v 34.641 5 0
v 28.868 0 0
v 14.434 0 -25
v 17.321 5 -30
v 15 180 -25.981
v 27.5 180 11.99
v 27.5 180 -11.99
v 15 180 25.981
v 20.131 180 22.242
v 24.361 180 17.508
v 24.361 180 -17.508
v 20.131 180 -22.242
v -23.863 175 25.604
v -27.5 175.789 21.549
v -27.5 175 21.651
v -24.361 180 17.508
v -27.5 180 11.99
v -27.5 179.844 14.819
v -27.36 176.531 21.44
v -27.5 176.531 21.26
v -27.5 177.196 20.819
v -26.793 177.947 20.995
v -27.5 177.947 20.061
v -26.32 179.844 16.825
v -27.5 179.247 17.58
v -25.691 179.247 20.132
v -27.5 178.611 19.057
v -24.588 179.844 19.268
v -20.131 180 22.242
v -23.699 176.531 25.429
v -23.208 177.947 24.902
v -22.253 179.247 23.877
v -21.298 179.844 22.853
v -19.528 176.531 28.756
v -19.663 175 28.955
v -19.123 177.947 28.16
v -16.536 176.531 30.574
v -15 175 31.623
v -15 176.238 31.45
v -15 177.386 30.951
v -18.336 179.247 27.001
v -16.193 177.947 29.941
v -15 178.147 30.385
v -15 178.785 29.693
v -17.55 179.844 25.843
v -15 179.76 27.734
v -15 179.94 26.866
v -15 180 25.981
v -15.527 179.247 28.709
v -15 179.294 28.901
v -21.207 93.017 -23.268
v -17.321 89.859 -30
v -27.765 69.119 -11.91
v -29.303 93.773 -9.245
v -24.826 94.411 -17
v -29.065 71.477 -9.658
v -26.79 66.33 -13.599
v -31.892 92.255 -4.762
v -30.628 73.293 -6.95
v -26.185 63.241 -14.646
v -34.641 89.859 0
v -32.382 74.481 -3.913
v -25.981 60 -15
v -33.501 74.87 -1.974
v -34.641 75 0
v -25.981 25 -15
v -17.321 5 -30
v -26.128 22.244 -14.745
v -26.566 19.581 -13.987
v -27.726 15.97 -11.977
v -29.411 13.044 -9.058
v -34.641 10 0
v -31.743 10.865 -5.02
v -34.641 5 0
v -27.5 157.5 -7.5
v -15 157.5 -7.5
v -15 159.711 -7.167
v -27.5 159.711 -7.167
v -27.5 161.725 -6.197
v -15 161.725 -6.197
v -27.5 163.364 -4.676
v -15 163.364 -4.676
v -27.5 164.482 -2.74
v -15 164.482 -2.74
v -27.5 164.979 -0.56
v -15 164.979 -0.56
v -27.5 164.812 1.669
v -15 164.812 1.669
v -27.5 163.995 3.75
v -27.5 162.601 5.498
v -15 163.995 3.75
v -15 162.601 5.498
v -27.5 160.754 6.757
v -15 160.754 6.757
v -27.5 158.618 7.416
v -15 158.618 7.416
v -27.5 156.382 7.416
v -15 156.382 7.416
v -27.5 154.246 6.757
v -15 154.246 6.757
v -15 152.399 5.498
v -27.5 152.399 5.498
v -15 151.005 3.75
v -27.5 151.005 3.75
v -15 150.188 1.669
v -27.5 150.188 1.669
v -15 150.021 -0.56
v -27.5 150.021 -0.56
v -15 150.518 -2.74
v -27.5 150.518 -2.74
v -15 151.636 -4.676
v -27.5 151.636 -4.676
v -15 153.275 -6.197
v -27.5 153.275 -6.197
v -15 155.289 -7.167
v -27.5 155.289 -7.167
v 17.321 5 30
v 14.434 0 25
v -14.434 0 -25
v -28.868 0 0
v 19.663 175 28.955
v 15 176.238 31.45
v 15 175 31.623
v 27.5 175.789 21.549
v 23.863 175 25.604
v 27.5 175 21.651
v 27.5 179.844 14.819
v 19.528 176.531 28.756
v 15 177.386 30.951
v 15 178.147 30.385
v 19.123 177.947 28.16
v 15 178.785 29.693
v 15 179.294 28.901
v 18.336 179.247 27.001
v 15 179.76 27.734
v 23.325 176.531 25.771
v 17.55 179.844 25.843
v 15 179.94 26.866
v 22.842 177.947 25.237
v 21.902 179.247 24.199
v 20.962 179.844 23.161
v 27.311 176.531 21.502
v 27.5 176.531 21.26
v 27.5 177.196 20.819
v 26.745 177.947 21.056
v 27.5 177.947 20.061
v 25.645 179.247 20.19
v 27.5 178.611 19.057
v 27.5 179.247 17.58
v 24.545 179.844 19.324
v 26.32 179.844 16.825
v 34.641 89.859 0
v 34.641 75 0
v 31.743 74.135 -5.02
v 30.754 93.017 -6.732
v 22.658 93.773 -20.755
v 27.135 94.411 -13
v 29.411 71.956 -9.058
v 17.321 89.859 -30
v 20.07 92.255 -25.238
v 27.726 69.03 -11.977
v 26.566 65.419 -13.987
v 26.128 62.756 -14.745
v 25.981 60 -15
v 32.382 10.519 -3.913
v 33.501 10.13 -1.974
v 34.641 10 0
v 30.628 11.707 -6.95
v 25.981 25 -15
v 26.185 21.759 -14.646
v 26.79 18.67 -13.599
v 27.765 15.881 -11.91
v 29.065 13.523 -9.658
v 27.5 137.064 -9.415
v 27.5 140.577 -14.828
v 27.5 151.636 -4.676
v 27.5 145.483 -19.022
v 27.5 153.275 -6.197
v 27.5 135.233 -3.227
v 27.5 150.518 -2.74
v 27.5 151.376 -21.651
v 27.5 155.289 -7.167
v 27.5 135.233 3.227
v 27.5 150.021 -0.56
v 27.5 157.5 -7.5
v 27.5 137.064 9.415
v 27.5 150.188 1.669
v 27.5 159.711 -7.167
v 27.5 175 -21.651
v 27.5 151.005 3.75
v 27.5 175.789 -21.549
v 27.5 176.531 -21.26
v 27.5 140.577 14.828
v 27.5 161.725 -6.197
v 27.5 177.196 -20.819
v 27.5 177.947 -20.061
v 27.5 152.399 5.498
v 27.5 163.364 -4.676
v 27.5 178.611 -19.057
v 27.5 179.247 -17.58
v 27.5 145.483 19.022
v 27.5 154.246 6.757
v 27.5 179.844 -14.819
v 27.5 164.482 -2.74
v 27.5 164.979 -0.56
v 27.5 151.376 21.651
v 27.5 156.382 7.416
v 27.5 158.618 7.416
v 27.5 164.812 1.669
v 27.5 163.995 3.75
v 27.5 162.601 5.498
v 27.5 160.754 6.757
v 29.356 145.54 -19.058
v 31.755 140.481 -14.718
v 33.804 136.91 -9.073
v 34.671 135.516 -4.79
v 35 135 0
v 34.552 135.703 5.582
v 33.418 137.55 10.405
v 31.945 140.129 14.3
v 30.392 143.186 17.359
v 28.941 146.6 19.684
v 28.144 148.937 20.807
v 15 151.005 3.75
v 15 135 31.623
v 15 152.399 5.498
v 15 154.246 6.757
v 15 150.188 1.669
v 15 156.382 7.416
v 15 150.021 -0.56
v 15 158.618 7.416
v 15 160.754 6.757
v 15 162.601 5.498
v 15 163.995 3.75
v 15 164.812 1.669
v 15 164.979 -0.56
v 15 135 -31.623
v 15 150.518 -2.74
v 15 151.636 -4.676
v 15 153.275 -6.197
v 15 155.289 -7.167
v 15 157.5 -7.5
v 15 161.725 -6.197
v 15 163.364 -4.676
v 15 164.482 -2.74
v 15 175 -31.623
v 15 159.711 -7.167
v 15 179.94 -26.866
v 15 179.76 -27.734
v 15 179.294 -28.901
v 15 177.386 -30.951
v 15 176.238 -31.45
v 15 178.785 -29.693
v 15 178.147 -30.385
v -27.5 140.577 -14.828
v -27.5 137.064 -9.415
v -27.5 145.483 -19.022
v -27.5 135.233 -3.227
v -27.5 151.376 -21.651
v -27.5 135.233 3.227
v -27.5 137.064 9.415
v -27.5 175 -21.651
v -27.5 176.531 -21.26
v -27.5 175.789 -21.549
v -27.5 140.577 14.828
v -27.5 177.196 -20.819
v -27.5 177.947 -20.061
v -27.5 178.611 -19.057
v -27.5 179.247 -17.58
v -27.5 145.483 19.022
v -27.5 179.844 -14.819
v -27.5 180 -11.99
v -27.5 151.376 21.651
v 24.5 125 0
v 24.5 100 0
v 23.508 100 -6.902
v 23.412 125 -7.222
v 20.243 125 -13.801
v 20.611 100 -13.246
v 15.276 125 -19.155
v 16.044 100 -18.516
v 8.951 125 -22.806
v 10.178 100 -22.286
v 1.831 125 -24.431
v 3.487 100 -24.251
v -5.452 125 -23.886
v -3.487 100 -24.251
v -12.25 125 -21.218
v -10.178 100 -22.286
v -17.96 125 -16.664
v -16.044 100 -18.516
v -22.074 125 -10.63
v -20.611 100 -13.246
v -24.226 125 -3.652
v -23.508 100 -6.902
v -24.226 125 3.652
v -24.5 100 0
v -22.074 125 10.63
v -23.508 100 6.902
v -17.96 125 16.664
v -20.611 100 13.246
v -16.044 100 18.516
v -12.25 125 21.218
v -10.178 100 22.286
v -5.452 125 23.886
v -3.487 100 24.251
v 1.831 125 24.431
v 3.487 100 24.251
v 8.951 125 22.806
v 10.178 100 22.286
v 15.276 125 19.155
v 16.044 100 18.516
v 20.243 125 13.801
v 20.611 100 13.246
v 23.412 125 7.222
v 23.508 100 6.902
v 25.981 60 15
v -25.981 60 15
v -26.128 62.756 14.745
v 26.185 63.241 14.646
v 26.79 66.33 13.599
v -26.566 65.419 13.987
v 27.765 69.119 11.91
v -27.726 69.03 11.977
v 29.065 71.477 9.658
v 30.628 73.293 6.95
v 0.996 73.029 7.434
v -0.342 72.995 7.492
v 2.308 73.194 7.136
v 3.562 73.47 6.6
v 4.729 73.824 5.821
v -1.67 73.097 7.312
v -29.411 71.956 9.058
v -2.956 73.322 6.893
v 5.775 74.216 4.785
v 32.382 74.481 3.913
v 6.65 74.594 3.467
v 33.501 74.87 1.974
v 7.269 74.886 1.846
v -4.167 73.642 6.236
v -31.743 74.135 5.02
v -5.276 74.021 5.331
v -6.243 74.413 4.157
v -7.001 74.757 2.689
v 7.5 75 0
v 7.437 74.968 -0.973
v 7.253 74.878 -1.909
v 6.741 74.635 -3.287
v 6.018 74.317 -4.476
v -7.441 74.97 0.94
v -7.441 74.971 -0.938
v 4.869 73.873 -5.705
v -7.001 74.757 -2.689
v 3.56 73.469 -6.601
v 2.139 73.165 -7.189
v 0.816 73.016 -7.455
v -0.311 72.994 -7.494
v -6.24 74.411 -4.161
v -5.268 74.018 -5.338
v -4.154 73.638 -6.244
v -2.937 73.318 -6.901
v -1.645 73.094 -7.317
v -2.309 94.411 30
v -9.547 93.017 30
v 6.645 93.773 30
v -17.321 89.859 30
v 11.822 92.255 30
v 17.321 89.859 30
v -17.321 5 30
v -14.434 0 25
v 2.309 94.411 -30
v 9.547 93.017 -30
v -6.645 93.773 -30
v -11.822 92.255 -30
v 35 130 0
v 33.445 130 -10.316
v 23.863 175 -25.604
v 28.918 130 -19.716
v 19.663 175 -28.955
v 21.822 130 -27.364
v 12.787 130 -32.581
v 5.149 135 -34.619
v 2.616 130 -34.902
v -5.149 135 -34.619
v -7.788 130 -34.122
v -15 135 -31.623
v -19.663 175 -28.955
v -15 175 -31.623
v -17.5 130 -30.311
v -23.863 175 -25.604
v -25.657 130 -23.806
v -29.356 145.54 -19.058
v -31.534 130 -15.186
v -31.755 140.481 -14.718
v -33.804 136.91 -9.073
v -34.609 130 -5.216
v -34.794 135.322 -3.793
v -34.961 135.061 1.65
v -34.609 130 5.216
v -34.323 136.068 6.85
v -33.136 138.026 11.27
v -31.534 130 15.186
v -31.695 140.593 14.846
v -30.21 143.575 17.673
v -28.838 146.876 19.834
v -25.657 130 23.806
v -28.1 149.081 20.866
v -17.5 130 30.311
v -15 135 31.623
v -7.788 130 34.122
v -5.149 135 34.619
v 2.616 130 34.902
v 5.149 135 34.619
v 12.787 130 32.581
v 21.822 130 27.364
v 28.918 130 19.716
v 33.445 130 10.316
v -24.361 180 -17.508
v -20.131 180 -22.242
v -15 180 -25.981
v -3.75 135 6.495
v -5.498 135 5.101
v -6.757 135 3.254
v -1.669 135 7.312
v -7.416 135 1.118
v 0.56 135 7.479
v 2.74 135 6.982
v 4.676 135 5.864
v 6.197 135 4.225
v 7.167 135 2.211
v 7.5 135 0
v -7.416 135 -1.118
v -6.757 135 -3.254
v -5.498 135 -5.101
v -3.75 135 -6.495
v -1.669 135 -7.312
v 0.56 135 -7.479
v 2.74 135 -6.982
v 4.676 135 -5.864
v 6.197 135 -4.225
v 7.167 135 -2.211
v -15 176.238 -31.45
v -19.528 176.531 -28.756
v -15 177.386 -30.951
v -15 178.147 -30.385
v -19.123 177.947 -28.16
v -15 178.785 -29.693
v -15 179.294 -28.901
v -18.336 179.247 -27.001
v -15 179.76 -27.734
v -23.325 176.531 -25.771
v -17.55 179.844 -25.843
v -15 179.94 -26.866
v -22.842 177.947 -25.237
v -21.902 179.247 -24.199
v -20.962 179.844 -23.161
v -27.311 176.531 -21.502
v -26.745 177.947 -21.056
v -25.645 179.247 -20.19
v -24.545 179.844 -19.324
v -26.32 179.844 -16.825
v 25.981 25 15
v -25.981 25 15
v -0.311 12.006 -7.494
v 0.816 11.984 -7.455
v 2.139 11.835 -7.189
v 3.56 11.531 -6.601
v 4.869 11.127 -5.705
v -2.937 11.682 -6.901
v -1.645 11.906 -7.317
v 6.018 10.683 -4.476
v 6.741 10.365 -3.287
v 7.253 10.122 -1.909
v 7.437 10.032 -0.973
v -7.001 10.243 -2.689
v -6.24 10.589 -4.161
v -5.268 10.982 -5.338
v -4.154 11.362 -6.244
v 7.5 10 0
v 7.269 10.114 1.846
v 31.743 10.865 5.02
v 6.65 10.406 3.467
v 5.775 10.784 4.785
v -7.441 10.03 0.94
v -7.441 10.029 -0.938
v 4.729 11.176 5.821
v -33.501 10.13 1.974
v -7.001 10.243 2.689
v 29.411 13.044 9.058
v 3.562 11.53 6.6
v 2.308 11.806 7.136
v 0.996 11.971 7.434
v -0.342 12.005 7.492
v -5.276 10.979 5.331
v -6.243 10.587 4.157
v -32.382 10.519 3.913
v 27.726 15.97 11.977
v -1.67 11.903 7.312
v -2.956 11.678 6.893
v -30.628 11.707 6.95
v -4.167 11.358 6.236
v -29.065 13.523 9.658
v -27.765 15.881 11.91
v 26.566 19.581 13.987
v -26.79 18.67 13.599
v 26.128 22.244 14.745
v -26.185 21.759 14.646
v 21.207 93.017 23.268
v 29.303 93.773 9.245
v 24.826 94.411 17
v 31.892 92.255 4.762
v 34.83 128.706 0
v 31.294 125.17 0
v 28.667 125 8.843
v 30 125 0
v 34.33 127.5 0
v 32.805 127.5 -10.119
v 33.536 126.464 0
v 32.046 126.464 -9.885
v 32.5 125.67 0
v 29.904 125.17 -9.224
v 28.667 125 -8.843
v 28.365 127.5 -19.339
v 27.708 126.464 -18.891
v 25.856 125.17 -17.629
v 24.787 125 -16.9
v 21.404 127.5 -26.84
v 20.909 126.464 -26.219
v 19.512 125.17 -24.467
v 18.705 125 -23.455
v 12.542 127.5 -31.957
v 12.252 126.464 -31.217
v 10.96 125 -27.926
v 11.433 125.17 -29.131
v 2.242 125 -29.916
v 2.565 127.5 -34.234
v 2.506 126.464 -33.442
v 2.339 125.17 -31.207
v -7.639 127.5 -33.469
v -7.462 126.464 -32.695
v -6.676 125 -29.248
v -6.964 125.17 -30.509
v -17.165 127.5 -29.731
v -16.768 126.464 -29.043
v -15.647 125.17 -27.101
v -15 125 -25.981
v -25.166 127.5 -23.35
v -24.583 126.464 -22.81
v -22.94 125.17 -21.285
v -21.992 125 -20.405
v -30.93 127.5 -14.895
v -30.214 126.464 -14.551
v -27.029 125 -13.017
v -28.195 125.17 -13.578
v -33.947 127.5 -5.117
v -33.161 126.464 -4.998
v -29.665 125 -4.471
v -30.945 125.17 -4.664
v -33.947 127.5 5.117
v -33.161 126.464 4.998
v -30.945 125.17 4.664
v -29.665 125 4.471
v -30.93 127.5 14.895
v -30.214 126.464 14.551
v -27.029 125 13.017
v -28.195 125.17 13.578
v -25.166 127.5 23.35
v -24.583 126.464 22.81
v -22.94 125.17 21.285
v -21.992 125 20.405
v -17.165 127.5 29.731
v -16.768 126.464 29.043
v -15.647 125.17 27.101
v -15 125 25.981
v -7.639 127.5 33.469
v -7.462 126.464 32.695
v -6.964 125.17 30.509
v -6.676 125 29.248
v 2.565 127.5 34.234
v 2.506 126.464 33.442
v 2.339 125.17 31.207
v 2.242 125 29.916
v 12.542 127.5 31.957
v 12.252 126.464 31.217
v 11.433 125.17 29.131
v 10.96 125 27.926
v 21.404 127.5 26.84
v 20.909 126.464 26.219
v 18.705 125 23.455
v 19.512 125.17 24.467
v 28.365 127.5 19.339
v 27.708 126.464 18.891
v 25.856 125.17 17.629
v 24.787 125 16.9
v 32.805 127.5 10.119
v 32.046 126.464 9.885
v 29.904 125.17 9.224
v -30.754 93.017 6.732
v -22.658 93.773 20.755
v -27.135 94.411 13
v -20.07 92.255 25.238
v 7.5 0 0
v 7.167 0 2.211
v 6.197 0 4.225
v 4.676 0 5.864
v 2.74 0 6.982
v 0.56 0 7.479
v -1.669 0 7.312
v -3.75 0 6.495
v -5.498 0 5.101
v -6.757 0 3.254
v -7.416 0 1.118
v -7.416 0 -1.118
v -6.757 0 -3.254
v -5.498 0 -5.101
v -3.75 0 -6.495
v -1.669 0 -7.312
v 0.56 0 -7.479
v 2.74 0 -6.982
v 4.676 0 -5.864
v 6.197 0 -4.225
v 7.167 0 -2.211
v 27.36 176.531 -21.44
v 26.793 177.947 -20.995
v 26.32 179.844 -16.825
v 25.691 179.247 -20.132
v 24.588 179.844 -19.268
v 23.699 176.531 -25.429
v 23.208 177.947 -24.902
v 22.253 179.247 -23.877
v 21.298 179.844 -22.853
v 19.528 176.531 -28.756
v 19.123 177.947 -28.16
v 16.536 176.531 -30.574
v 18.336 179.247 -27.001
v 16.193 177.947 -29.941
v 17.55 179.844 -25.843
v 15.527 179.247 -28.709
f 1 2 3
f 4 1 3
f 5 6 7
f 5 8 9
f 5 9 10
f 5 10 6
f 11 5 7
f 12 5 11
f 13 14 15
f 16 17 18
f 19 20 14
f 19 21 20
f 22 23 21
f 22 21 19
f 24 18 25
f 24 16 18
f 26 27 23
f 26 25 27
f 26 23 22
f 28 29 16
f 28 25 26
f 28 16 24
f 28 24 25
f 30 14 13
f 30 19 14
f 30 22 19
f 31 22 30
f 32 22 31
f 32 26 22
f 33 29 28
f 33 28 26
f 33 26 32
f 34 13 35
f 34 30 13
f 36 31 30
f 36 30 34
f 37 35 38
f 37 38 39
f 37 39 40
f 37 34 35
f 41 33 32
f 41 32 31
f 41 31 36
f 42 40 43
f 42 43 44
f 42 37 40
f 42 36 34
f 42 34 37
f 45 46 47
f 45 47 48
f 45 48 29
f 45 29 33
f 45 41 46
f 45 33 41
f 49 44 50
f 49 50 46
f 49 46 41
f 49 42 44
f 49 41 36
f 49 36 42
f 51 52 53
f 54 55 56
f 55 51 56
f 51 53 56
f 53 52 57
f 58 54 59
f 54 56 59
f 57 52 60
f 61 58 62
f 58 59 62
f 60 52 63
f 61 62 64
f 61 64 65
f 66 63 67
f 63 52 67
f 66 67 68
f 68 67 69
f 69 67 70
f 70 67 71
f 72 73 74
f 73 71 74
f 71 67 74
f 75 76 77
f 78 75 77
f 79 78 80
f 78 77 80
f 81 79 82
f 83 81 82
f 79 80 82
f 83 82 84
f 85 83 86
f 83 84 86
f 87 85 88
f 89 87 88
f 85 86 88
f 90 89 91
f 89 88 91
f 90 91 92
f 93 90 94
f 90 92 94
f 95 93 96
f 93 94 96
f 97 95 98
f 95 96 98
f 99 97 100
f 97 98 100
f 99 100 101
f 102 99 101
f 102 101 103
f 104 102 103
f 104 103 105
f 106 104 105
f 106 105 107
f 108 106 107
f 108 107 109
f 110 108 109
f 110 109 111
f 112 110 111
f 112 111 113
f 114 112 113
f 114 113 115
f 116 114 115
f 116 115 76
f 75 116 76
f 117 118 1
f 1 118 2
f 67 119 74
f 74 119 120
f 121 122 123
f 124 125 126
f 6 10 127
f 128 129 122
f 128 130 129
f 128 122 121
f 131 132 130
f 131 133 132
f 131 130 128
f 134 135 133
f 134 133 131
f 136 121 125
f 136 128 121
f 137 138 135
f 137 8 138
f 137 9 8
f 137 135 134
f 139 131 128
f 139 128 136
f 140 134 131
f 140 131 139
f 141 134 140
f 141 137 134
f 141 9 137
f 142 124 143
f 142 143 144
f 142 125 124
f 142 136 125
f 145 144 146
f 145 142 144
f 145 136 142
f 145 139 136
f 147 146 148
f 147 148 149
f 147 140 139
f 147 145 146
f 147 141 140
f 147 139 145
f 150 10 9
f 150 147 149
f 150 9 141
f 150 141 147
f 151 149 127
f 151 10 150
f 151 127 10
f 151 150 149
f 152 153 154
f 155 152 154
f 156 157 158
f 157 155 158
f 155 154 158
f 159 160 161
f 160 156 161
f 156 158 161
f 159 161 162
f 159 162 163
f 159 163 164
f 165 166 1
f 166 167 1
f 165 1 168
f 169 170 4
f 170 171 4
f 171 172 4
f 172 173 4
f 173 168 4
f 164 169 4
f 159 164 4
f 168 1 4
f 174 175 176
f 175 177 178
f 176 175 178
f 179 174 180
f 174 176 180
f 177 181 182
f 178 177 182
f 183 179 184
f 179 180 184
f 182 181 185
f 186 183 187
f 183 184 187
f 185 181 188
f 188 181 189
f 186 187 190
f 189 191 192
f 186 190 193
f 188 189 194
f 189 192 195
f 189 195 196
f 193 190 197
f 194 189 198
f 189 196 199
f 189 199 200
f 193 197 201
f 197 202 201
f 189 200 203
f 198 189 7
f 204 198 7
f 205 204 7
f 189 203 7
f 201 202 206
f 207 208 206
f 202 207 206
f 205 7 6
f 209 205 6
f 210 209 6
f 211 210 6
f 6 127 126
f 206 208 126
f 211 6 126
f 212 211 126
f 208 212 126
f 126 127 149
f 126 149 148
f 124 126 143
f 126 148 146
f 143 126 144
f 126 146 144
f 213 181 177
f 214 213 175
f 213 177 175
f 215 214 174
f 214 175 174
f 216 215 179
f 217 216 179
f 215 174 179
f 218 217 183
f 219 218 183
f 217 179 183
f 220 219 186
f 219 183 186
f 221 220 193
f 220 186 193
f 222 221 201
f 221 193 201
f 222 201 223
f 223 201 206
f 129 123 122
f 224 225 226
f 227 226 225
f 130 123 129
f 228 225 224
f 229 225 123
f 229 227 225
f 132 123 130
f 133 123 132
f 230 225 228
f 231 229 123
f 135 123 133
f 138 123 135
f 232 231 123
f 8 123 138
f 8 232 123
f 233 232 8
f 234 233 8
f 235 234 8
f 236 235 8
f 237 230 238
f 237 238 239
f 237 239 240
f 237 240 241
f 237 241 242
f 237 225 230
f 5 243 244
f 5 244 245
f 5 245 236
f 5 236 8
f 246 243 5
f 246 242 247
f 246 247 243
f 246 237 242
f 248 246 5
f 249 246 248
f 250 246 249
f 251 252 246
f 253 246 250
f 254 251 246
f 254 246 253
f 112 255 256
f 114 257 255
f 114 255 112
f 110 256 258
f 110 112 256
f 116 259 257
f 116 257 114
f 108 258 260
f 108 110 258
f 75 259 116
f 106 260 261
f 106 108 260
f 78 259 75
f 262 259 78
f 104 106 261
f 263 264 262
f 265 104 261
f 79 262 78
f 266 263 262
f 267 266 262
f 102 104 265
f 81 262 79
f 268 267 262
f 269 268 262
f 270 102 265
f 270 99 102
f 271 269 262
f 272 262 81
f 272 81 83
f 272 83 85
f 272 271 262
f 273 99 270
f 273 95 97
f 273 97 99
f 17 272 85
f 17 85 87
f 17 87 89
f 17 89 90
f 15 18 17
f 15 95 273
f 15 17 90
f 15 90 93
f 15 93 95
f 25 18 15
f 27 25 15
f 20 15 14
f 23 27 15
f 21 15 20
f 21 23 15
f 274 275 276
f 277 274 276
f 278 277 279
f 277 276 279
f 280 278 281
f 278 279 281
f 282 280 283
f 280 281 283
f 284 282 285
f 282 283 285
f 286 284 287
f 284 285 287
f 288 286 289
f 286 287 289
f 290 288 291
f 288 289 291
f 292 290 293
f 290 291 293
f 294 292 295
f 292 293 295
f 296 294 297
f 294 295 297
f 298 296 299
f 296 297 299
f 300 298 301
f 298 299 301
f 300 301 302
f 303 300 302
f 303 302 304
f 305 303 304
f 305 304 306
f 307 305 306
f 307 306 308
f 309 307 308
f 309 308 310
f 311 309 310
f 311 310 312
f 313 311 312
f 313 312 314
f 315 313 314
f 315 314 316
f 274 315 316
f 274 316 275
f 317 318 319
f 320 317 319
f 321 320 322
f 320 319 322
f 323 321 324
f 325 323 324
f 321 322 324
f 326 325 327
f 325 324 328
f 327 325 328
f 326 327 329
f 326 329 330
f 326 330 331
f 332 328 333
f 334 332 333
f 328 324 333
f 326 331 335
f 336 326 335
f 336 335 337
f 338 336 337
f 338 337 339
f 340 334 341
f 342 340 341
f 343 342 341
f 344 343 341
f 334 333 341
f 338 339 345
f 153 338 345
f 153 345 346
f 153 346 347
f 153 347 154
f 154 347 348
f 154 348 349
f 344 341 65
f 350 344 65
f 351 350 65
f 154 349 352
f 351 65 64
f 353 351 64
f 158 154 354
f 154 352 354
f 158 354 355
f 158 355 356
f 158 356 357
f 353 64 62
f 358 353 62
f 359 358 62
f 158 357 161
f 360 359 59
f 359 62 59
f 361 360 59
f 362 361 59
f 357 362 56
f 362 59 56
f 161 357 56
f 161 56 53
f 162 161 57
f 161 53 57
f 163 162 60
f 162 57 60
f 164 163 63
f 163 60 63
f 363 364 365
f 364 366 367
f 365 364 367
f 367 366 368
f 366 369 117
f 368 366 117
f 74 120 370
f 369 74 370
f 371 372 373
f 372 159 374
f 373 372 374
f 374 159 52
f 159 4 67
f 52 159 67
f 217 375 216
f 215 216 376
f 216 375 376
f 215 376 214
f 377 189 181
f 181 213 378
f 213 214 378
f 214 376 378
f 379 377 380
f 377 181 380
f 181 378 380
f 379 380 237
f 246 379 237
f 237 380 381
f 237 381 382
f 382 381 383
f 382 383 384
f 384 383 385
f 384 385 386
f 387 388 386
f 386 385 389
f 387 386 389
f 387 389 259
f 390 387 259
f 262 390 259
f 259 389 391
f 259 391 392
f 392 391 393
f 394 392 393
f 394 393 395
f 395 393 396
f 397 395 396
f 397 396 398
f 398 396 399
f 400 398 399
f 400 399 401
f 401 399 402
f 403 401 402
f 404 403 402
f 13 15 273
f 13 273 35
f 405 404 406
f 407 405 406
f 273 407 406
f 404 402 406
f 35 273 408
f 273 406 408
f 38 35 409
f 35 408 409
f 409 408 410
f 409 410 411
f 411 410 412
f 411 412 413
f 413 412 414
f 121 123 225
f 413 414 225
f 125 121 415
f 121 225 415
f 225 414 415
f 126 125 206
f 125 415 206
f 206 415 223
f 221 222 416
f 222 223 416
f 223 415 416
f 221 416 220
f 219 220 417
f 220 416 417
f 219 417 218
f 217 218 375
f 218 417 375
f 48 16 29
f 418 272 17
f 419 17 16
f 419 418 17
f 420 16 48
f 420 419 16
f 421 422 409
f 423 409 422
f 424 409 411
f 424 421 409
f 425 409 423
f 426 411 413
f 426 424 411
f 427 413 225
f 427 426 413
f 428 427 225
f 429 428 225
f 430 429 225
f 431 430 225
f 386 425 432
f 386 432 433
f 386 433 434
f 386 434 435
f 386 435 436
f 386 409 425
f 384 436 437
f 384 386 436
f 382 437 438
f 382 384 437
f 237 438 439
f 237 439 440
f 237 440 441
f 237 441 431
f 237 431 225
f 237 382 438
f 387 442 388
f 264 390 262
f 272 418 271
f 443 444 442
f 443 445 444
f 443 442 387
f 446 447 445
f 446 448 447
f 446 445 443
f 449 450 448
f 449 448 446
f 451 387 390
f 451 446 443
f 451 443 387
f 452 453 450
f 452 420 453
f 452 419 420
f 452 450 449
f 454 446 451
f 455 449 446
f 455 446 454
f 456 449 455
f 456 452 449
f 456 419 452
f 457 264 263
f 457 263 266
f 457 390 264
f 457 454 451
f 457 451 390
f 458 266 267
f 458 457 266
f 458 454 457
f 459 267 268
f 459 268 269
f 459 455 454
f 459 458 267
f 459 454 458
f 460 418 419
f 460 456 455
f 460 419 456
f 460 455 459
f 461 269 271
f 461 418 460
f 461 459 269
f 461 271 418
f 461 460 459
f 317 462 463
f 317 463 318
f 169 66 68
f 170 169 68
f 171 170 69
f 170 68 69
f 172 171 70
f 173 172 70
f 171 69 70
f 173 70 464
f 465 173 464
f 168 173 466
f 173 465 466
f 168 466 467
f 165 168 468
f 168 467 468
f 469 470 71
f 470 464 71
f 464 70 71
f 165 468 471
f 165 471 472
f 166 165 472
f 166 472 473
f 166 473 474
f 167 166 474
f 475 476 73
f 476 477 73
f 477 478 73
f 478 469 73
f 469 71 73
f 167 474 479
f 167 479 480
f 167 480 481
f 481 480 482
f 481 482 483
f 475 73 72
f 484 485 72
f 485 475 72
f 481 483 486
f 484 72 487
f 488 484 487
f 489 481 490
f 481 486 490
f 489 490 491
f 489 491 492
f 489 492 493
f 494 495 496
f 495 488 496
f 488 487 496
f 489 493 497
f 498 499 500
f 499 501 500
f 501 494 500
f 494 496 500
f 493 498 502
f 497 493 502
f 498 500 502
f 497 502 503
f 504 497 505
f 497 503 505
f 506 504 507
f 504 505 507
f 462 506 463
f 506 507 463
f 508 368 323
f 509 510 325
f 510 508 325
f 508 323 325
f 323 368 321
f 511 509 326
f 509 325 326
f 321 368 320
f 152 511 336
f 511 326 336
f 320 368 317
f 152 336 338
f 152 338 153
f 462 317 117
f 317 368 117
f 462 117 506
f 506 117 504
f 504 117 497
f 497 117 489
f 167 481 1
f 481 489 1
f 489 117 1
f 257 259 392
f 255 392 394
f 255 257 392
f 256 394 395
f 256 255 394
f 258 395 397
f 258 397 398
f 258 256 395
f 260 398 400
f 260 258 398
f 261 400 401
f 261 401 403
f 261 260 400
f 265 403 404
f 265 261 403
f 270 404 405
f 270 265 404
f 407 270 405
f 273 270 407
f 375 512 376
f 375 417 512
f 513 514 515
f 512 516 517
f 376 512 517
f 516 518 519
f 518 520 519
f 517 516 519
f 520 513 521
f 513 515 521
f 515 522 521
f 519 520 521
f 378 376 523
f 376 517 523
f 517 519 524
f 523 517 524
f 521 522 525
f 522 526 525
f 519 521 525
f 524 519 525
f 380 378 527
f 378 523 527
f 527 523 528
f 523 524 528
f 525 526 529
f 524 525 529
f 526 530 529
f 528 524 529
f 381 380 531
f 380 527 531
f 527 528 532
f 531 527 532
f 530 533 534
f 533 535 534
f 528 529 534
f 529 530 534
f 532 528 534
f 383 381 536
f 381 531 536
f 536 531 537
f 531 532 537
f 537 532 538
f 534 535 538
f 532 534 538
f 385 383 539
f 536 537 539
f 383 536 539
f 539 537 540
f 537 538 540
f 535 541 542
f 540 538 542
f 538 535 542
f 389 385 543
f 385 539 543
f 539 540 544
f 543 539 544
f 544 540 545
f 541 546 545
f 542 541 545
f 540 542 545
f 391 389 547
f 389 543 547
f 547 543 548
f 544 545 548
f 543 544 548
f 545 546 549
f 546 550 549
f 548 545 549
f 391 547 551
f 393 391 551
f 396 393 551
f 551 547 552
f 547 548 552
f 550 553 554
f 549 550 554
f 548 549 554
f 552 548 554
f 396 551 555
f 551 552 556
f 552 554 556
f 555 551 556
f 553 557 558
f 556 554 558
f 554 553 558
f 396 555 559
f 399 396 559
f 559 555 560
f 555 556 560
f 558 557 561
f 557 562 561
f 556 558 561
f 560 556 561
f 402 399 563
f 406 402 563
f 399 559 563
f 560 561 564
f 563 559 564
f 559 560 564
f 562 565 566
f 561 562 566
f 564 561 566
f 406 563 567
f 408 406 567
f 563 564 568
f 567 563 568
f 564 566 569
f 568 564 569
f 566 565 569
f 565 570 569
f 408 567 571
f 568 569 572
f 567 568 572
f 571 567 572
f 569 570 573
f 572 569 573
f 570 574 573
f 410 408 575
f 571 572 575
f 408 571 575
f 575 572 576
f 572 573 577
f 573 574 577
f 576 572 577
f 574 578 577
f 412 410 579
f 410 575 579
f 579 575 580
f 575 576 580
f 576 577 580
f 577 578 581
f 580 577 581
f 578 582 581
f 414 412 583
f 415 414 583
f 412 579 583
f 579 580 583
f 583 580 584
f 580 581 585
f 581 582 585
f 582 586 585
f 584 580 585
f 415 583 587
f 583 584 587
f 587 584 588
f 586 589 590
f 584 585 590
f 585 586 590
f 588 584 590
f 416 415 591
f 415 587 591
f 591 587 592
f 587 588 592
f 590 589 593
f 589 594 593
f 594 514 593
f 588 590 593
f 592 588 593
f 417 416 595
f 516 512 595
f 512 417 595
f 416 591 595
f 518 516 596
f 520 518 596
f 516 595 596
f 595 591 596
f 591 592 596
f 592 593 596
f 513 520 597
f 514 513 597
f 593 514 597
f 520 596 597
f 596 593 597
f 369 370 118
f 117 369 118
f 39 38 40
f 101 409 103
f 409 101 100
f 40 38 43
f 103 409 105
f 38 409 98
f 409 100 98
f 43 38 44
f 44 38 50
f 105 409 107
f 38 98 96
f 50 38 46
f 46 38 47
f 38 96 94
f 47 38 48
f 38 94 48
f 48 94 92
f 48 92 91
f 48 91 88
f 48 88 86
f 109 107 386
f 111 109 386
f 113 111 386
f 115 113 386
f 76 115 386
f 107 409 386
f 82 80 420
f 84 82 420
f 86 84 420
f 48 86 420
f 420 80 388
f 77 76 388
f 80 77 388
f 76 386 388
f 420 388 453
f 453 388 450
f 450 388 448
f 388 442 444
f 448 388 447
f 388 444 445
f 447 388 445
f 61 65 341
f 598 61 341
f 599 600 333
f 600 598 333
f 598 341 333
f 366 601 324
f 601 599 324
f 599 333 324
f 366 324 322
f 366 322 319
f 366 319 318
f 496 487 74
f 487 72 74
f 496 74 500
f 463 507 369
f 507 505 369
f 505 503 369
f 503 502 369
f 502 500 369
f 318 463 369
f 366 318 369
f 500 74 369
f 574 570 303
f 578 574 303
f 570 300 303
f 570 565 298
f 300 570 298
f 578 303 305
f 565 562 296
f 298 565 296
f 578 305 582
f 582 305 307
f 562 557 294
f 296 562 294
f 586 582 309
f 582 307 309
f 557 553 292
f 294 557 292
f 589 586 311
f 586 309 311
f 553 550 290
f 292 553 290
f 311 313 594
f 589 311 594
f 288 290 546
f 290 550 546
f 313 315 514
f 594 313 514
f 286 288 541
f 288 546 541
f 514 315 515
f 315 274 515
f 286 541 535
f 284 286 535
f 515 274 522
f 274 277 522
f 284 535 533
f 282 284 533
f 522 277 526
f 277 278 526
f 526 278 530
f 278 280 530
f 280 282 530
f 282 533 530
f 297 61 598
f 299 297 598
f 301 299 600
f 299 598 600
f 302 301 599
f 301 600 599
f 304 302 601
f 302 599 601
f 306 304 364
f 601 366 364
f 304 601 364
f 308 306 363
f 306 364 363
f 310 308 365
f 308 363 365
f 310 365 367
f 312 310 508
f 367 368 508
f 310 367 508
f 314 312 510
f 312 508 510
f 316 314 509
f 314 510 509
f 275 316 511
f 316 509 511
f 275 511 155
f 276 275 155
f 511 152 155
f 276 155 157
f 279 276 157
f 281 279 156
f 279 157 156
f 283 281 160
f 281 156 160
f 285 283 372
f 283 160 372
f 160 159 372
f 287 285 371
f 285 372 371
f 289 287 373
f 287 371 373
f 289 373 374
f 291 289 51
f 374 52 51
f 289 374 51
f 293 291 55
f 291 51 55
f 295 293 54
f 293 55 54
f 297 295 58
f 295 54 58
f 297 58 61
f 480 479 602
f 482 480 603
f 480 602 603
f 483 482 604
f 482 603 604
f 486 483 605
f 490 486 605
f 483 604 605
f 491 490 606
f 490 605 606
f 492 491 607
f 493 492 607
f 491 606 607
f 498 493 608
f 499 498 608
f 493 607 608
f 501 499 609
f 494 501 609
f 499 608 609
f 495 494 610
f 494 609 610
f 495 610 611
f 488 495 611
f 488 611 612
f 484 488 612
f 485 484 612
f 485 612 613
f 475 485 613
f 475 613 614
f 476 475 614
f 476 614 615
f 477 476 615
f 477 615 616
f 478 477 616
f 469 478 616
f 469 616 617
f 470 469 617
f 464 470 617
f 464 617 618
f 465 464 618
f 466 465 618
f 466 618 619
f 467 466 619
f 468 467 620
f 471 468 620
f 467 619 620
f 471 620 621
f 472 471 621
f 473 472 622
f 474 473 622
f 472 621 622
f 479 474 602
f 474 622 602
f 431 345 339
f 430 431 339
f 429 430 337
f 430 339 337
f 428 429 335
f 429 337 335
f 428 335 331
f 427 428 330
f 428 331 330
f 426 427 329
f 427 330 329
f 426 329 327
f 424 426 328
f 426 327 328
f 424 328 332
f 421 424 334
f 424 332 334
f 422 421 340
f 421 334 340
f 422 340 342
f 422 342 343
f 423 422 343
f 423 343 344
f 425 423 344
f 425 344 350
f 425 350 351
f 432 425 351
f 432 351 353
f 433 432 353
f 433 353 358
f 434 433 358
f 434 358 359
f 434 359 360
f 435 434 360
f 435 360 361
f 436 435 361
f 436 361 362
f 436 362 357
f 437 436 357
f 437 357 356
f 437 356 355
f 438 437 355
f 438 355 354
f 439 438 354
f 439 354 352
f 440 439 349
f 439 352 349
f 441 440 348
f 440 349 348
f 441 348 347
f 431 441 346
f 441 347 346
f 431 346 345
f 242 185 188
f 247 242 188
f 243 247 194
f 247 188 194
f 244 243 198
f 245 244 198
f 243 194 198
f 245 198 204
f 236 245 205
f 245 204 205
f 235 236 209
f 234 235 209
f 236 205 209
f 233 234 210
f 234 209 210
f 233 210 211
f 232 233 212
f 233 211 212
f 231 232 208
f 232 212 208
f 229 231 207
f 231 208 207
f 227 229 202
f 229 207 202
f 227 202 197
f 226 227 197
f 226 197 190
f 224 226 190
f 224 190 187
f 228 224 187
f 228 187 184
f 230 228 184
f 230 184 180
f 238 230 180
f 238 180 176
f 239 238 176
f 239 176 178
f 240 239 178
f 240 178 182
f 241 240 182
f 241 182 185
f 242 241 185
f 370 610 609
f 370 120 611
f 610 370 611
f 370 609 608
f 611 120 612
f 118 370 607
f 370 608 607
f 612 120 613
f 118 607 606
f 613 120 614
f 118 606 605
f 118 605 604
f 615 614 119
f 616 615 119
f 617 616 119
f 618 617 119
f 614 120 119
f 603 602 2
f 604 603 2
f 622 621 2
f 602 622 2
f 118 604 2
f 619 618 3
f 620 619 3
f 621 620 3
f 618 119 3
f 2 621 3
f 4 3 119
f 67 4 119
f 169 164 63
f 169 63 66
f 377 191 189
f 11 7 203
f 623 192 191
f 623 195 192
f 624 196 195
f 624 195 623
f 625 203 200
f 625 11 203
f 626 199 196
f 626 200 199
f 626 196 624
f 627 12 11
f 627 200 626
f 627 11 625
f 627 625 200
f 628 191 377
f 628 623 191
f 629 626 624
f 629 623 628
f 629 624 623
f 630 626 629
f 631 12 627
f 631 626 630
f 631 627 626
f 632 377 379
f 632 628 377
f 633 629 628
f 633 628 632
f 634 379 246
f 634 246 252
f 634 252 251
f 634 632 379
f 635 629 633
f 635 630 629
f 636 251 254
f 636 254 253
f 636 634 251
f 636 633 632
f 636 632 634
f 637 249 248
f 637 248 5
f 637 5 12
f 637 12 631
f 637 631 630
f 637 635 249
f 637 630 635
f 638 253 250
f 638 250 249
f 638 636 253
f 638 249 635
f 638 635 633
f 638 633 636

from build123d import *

# Parameters (mm, degrees)
BOSS_EXTRUDE1_DEPTH     = 100
CHAMFER1_SIZE           = 5
CUT_EXTRUDE1_DEPTH      = 35.641016151
CUT_EXTRUDE1_DEPTH_BACK = 35.641016151
SKETCH3_R               = 24.5
BOSS_EXTRUDE2_DEPTH     = 25
SKETCH5_R               = 35
BOSS_EXTRUDE3_DEPTH     = 55
FILLET1_R               = 5
SKETCH6_W               = 30
SKETCH6_H               = 45
CUT_EXTRUDE2_DEPTH      = 36.0000001
CUT_EXTRUDE2_DEPTH_BACK = 36.0000001
CUT_EXTRUDE3_DEPTH      = 8.5
SKETCH8_R               = 7.5
CUT_EXTRUDE4_DEPTH      = 55
FILLET2_R               = 5
SKETCH9_R               = 7.5
CUT_EXTRUDE5_DEPTH      = 181.0000001


with BuildPart() as part:
    # Sketch1 → Boss-Extrude1 (new body)
    with BuildSketch(Plane(origin=(0, 0, 0), x_dir=(1, 0, 0), z_dir=(0, 1, 0))):
        Polygon((34.641016151, 0), (17.320508076, 30), (-17.320508076, 30), (-34.641016151, 0), (-17.320508076, -30), (17.320508076, -30), align=None)
    extrude(amount=BOSS_EXTRUDE1_DEPTH)

    # Chamfer1
    chamfer1_edges = [part.edges().sort_by_distance(p)[0] for p in [
        (0, 0, 30),
        (-25.980762114, 0, 15),
        (-25.980762114, 0, -15),
        (0, 0, -30),
        (25.980762114, 0, -15),
        (25.980762114, 0, 15),
    ]]
    chamfer(chamfer1_edges, length=CHAMFER1_SIZE)

    # Sketch2 → Cut-Extrude1 (cut, two sides)
    with BuildSketch(Plane(origin=(0, 0, 0), x_dir=(0, 0, -1), z_dir=(1, 0, 0))) as cut_extrude1_sk:
        with BuildLine():
            Line((15, 60), (15, 25))
            ThreePointArc((15, 25), (0, 10), (-15, 25))
            Line((-15, 25), (-15, 60))
            ThreePointArc((-15, 60), (0, 75), (15, 60))
        make_face()
    extrude(amount=CUT_EXTRUDE1_DEPTH, mode=Mode.SUBTRACT)
    extrude(cut_extrude1_sk.sketch, amount=-CUT_EXTRUDE1_DEPTH_BACK, mode=Mode.SUBTRACT)

    # Sketch3 → Boss-Extrude2 (add)
    with BuildSketch(Plane(origin=(0, 100, 0), x_dir=(1, 0, 0), z_dir=(0, 1, 0))):
        Circle(SKETCH3_R)
    extrude(amount=BOSS_EXTRUDE2_DEPTH)

    # Sketch4 → Cut-Revolve1 (revolve, cut)
    with BuildSketch(Plane.XY):
        Polygon((-24.5, 100), (-37.5, 87), (-37.5, 100), align=None)
    revolve(axis=Axis((0, -6.25, 0), (0, 1, 0)), mode=Mode.SUBTRACT)

    # Sketch5 → Boss-Extrude3 (add)
    with BuildSketch(Plane(origin=(0, 125, 0), x_dir=(1, 0, 0), z_dir=(0, 1, 0))):
        Circle(SKETCH5_R)
    extrude(amount=BOSS_EXTRUDE3_DEPTH)

    # Fillet1
    fillet1_edges = [part.edges().sort_by_distance(p)[0] for p in [
        (-35, 125, 0),
    ]]
    fillet(fillet1_edges, radius=FILLET1_R)

    # Sketch6 → Cut-Extrude2 (cut, two sides)
    with BuildSketch(Plane.XY) as cut_extrude2_sk:
        with Locations((0, 157.5)):
            Rectangle(SKETCH6_W, SKETCH6_H)
    extrude(amount=CUT_EXTRUDE2_DEPTH, mode=Mode.SUBTRACT)
    extrude(cut_extrude2_sk.sketch, amount=-CUT_EXTRUDE2_DEPTH_BACK, mode=Mode.SUBTRACT)

    # Sketch7 → Cut-Extrude3 (cut, through all)
    with BuildSketch(Plane(origin=(27.5, 0, 0), x_dir=(0, 0, -1), z_dir=(1, 0, 0))):
        with BuildLine():
            Line((-22.5, 180), (22.5, 180))
            Line((22.5, 180), (22.5, 157.5))
            ThreePointArc((22.5, 157.5), (0, 135), (-22.5, 157.5))
            Line((-22.5, 157.5), (-22.5, 180))
        make_face()
    cut_extrude3 = extrude(amount=CUT_EXTRUDE3_DEPTH, mode=Mode.SUBTRACT)

    # Mirror1: Cut-Extrude3 across plane
    add(cut_extrude3.mirror(Plane(origin=(0, 0, 0), x_dir=(0, 0, 1), z_dir=(1, 0, 0))), mode=Mode.SUBTRACT)

    # Sketch8 → Cut-Extrude4 (cut)
    with BuildSketch(Plane(origin=(27.5, 0, 0), x_dir=(0, 0, -1), z_dir=(1, 0, 0))):
        with Locations((0, 157.5)):
            Circle(SKETCH8_R)
    extrude(amount=-CUT_EXTRUDE4_DEPTH, mode=Mode.SUBTRACT)

    # Fillet2
    fillet2_edges = [part.edges().sort_by_distance(p)[0] for p in [
        (21.827125362, 180, -27.360127895),
        (-21.827125362, 180, 27.360127895),
        (21.827125362, 180, 27.360127895),
        (-21.827125362, 180, -27.360127895),
    ]]
    fillet(fillet2_edges, radius=FILLET2_R)

    # Sketch9 → Cut-Extrude5 (cut, through all)
    with BuildSketch(Plane.XZ):
        Circle(SKETCH9_R)
    extrude(amount=-CUT_EXTRUDE5_DEPTH, mode=Mode.SUBTRACT)


solid = part.part
